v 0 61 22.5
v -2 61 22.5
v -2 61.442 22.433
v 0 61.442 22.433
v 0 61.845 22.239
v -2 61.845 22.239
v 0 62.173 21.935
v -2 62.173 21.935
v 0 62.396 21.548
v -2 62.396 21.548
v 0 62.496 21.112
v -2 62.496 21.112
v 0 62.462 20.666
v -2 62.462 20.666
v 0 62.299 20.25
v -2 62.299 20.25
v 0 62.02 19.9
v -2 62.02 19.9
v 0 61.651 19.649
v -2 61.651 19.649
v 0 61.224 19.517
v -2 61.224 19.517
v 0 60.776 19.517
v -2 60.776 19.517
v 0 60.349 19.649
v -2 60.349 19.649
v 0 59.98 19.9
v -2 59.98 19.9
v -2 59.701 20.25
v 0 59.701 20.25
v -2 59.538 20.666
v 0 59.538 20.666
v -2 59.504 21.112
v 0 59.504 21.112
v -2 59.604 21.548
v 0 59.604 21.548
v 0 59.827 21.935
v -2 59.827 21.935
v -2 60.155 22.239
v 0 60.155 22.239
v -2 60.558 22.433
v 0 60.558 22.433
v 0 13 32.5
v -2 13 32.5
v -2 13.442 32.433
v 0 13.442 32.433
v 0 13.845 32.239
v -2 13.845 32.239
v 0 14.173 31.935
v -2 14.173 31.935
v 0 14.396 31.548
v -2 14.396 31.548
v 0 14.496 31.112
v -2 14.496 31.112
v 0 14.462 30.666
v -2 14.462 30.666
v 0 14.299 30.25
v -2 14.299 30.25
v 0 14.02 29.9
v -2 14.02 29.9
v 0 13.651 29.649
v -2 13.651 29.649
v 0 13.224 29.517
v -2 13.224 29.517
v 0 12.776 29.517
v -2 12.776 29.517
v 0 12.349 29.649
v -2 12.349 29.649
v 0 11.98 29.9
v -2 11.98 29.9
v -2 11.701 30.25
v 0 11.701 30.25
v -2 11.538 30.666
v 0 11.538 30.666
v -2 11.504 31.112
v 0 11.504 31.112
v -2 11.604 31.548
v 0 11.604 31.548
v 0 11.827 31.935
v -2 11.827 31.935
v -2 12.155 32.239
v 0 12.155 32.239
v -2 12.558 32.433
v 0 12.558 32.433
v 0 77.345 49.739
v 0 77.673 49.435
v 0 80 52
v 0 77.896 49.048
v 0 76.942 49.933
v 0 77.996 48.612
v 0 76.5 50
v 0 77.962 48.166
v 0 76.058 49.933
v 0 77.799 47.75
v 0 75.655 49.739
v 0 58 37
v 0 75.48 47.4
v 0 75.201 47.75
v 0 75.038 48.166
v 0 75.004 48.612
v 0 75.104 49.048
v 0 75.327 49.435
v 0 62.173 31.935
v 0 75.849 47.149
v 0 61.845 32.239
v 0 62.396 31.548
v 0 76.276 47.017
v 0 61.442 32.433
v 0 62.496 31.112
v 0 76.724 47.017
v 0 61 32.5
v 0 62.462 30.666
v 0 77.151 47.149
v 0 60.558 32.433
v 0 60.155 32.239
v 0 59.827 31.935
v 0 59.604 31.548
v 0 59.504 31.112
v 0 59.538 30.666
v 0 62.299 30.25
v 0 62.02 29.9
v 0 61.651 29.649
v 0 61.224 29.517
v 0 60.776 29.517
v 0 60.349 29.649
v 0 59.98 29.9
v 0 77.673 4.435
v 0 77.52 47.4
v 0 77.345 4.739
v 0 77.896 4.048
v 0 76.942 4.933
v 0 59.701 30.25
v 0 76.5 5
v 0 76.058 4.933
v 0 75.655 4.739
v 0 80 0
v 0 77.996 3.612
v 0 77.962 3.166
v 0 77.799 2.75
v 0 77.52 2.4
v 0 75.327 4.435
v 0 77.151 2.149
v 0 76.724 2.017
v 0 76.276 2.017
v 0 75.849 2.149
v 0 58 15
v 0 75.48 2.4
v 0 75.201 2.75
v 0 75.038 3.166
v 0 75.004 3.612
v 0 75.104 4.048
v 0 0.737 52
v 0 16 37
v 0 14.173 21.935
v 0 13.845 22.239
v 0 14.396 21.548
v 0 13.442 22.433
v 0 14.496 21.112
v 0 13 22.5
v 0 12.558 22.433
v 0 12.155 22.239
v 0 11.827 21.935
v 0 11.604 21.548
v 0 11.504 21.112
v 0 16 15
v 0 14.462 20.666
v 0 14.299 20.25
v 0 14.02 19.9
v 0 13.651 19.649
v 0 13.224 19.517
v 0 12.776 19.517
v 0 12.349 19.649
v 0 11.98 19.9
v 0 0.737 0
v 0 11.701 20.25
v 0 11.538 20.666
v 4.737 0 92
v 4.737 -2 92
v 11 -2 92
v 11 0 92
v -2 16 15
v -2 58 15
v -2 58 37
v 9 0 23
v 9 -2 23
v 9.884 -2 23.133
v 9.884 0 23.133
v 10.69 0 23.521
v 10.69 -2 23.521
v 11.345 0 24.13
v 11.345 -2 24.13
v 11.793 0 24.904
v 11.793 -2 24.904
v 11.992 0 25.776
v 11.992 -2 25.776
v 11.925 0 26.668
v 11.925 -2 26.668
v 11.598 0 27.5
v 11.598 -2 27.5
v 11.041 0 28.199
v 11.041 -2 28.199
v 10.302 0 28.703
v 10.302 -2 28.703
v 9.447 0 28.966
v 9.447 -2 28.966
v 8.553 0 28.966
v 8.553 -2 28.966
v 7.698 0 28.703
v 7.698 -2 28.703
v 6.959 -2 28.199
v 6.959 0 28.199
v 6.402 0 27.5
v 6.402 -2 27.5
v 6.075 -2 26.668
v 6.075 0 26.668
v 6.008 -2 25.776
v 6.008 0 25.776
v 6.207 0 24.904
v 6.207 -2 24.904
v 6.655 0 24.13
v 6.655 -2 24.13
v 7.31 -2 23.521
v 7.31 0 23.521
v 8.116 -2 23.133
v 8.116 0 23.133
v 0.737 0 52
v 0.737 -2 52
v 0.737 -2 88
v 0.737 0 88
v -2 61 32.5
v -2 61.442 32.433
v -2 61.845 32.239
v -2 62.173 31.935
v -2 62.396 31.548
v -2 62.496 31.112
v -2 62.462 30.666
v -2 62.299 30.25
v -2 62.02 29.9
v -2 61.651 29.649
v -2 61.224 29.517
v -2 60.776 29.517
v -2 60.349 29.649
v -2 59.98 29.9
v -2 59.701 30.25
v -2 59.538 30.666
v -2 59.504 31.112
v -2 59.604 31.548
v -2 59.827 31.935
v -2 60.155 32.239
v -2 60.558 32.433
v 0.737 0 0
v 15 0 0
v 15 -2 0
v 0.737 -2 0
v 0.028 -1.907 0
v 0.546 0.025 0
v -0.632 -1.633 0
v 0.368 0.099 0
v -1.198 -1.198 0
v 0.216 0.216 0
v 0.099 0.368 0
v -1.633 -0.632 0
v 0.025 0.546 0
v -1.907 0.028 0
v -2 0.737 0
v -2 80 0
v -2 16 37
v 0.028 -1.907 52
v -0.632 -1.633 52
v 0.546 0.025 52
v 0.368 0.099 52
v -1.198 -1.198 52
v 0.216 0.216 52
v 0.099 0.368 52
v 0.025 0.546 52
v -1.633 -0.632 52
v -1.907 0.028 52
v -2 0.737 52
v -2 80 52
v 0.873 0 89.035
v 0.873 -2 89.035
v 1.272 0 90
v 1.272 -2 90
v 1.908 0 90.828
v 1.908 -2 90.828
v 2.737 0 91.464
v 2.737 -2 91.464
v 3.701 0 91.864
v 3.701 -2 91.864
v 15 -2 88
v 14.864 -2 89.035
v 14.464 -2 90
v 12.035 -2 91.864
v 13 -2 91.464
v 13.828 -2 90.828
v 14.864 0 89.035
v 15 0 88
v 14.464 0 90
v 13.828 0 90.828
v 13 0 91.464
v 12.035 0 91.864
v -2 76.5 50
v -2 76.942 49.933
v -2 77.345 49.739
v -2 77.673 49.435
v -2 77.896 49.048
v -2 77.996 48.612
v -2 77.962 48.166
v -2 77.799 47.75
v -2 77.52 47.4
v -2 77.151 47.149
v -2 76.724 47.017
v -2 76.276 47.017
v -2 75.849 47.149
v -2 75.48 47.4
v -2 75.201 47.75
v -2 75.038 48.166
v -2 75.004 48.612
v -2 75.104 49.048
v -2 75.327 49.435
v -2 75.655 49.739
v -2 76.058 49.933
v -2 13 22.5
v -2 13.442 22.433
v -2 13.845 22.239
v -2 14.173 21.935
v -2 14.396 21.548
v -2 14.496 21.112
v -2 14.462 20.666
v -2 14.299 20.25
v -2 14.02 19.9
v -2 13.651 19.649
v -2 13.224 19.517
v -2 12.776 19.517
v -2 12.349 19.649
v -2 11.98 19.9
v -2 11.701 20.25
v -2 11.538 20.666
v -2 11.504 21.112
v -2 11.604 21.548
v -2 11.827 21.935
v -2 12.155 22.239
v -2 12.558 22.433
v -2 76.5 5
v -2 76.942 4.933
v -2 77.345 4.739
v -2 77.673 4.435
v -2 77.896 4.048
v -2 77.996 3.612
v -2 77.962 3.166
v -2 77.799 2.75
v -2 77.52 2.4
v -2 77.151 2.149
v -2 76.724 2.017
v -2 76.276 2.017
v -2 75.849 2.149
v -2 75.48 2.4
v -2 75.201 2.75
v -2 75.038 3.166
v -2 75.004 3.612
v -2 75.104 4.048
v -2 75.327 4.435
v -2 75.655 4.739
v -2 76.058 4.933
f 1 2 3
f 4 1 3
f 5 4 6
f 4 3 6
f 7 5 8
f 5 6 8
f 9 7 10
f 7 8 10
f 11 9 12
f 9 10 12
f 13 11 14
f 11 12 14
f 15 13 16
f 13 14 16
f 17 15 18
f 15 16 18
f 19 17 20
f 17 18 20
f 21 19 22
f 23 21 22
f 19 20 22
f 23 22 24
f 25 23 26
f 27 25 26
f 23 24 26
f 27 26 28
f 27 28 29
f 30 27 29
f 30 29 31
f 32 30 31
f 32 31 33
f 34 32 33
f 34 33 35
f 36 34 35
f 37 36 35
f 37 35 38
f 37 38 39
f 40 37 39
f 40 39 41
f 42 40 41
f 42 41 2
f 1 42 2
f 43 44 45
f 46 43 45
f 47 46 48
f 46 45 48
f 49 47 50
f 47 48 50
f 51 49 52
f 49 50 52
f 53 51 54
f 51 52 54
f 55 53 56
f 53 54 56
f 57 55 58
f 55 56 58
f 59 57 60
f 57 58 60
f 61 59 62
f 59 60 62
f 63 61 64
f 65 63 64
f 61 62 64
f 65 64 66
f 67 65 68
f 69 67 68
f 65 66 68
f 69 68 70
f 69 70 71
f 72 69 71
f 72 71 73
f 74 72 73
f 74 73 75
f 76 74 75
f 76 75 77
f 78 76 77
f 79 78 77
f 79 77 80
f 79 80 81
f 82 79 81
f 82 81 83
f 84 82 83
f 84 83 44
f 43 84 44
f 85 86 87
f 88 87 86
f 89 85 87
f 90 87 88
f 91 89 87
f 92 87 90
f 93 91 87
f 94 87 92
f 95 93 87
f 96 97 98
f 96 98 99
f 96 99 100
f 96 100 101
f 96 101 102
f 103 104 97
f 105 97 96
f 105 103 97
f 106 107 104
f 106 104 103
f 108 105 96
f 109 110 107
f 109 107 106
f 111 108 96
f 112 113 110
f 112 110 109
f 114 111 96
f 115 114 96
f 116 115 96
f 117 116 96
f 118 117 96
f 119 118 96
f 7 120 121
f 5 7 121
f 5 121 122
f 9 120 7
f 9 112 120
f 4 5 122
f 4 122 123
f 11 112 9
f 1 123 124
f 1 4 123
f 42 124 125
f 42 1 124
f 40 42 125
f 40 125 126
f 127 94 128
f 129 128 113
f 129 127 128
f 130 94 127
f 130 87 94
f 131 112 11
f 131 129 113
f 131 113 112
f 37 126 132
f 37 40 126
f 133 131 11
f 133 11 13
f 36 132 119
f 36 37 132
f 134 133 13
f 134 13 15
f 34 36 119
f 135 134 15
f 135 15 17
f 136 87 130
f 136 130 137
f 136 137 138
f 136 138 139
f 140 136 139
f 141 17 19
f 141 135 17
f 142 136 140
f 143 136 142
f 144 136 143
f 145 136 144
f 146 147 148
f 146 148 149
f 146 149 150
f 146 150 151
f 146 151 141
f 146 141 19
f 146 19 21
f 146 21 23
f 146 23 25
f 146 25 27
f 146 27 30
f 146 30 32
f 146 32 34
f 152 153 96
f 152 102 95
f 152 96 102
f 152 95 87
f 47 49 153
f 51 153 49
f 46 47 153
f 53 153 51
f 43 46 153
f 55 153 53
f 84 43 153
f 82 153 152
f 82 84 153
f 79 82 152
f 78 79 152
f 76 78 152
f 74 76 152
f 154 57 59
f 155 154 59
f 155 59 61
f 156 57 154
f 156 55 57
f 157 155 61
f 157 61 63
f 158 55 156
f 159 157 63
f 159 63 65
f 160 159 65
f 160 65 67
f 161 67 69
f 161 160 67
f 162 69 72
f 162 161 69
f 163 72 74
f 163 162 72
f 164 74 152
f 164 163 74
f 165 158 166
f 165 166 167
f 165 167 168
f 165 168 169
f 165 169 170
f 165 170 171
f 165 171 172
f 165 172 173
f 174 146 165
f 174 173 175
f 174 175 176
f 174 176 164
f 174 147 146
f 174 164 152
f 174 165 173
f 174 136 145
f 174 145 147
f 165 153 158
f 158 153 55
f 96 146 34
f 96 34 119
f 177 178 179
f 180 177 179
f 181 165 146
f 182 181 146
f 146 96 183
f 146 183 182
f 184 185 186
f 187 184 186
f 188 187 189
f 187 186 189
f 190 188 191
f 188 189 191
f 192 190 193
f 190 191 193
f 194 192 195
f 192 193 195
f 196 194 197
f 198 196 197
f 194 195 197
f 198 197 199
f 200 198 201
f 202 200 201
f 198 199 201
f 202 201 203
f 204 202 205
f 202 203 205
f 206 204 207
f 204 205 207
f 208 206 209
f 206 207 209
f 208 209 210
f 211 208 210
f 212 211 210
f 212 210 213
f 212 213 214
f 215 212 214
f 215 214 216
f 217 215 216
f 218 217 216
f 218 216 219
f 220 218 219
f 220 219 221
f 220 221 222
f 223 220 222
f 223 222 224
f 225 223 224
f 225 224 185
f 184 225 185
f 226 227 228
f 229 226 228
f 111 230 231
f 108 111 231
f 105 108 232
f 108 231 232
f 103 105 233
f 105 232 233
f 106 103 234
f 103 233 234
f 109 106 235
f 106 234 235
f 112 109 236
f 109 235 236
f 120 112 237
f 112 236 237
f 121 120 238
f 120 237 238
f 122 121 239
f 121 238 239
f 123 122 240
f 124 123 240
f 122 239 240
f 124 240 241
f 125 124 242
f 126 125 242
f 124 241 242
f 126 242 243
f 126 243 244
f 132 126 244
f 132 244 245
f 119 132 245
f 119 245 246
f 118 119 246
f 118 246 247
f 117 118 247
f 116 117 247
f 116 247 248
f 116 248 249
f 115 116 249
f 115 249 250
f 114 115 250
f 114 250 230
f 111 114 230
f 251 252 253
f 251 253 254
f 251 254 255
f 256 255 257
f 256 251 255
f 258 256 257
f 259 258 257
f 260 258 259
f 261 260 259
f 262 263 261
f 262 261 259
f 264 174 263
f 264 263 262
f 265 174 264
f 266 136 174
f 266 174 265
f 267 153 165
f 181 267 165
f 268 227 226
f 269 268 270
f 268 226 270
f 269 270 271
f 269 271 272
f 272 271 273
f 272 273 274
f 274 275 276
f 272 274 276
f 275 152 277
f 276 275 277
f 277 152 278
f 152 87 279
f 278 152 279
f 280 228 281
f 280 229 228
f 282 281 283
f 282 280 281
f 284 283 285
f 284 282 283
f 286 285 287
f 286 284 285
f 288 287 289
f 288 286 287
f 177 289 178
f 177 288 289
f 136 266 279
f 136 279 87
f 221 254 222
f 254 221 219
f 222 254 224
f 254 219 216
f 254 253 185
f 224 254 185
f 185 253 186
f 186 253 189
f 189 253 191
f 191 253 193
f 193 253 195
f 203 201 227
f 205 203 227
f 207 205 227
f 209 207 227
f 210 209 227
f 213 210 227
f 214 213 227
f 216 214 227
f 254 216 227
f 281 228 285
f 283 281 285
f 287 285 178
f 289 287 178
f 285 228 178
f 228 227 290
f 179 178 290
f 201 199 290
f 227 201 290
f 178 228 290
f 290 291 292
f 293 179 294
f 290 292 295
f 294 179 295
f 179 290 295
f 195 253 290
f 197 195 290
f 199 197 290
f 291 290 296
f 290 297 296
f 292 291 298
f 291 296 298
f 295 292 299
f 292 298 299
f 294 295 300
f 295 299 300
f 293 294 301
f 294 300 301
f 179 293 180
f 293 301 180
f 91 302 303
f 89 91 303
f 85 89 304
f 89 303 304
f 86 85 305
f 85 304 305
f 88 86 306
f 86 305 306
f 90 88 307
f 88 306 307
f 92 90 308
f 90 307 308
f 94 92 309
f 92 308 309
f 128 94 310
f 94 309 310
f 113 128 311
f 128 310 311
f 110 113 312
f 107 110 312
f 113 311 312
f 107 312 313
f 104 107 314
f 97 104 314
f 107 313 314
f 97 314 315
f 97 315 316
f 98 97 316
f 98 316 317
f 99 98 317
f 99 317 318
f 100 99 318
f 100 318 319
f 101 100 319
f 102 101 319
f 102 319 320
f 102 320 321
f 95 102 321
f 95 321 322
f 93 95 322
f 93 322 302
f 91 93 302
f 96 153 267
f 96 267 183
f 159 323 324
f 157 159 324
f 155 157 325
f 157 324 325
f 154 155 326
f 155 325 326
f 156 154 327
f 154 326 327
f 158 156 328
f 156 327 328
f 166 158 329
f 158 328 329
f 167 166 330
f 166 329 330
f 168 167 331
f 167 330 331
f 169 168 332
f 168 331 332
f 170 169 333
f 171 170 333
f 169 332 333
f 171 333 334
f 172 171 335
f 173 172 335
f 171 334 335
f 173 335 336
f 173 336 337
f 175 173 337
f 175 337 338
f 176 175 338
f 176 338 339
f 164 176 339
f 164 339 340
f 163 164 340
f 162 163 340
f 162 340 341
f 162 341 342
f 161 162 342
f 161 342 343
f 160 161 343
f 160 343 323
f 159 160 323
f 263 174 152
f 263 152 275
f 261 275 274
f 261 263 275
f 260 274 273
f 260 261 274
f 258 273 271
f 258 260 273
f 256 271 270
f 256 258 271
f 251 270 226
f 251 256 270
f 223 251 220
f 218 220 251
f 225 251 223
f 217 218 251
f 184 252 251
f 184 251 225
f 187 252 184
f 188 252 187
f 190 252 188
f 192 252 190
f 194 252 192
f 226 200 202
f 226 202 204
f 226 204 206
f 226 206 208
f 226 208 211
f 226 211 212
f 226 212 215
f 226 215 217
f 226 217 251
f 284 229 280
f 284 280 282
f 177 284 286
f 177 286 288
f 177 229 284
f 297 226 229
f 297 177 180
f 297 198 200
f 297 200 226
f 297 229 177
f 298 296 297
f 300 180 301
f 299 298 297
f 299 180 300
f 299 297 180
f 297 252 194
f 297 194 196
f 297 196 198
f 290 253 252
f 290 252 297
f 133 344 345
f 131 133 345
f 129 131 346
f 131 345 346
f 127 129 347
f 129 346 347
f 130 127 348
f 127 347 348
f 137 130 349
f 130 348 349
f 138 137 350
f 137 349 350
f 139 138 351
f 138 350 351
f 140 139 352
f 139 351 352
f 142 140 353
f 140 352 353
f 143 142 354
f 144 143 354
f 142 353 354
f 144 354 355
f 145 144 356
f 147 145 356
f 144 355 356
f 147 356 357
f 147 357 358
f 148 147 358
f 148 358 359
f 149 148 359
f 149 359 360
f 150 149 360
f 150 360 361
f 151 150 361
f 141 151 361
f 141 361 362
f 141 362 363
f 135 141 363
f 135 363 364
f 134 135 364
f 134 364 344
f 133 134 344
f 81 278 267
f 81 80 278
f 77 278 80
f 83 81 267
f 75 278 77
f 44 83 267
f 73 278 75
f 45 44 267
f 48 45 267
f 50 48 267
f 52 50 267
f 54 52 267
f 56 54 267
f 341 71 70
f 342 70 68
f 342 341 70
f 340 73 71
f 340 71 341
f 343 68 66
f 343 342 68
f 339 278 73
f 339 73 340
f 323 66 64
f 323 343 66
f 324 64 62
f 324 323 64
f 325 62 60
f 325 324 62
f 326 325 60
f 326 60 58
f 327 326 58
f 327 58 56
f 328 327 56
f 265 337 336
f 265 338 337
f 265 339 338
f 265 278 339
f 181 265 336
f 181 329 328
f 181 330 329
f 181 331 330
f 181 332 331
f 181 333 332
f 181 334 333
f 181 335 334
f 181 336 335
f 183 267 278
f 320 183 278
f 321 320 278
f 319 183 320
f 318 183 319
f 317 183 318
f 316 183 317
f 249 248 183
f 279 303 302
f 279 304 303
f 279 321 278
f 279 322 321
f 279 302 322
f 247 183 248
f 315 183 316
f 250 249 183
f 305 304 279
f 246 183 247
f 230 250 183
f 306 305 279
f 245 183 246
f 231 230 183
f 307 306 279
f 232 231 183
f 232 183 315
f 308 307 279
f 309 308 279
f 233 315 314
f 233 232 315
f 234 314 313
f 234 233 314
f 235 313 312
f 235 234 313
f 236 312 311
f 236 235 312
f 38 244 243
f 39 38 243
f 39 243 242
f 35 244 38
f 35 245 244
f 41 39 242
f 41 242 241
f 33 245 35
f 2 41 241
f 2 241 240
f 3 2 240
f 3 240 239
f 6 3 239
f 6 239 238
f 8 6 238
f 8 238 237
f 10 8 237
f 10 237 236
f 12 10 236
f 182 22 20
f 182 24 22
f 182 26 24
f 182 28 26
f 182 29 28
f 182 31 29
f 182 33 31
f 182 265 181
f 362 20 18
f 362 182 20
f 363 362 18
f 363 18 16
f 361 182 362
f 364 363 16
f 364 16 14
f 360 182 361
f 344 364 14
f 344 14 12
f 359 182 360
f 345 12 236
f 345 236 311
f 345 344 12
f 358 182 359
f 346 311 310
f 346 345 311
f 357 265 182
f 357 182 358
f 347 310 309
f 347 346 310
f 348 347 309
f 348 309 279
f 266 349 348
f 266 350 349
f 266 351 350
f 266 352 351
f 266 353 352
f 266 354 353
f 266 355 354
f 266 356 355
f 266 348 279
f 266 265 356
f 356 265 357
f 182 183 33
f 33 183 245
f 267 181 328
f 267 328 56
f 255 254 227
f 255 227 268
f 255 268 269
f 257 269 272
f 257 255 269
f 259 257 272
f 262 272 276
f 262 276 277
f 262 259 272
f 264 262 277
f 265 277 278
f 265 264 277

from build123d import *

# Parameters (mm, degrees)
SM_BASE_FLANGE_1_DEPTH       = 52
CUT_EXTRUDE_1_REACH          = 100.25
SKETCH_6_R                   = 3
HOLE_WIZARD_M3_2_D           = 2.5
HOLE_WIZARD_M3_2_DEPTH       = 7.5
HOLE_WIZARD_M3_2_CBORE_D     = 3
HOLE_WIZARD_M3_2_CBORE_DEPTH = 6
HOLE_WIZARD_M3_2_TIP         = 0.751075774
SKETCH_9_W                   = 22
SKETCH_9_H                   = 42
CUT_EXTRUDE_2_DEPTH          = 10
SKETCH_10_W                  = 40
SKETCH_10_H                  = 14.2634
EXTRUDE_4_DEPTH              = 2
FILLET_1_R                   = 4


# Sheet-metal steps are written as plain solids
with BuildPart() as part:
    # Sketch 1 → 基材-凸緣1 (new body)
    with BuildSketch(Plane.XY):
        with BuildLine():
            Line((0, 80), (0, 0.7366))
            ThreePointArc((0, 0.7366), (0.215745145, 0.215745145), (0.7366, 0))
            Line((0.7366, 0), (15, 0))
            Line((15, 0), (15, -2))
            Line((15, -2), (0.7366, -2))
            ThreePointArc((0.7366, -2), (-1.198468417, -1.198468417), (-2, 0.7366))
            Line((-2, 0.7366), (-2, 80))
            Line((-2, 80), (0, 80))
        make_face()
    extrude(amount=SM_BASE_FLANGE_1_DEPTH)

    # 草圖6 → 除料-伸長1 (cut, up to next)
    with BuildSketch(Plane.XZ.offset(2), mode=Mode.PRIVATE) as cut_extrude_1_sk1:
        with Locations(Location((9, 26, 0), (0, 0, 270))):
            Circle(SKETCH_6_R)
    cut_extrude_1_tool1 = extrude(cut_extrude_1_sk1.sketch, amount=-CUT_EXTRUDE_1_REACH, mode=Mode.PRIVATE) & part.part
    add(cut_extrude_1_tool1.solids().sort_by_distance((9, -2, 26))[0], mode=Mode.SUBTRACT)

    # M3 螺紋孔2
    with Locations(Plane.ZY.offset(2)):
        with Locations((21, 61), (21, 13), (31, 13), (31, 61), (3.5, 76.5), (48.5, 76.5)):
            CounterBoreHole(HOLE_WIZARD_M3_2_D / 2, HOLE_WIZARD_M3_2_CBORE_D / 2, HOLE_WIZARD_M3_2_CBORE_DEPTH, depth=HOLE_WIZARD_M3_2_DEPTH)
            with Locations((0, 0, -(HOLE_WIZARD_M3_2_DEPTH + HOLE_WIZARD_M3_2_TIP / 2))):  # 118° drill point
                Cone(0, HOLE_WIZARD_M3_2_D / 2, HOLE_WIZARD_M3_2_TIP, mode=Mode.SUBTRACT)

    # 草圖9 → 除料-伸長2 (cut)
    with BuildSketch(Plane(origin=(0, 0, 0), x_dir=(0, 0, -1), z_dir=(1, 0, 0))):
        with Locations((-26, 37)):
            Rectangle(SKETCH_9_W, SKETCH_9_H)
    extrude(amount=-CUT_EXTRUDE_2_DEPTH, mode=Mode.SUBTRACT)

    # 草圖10 → 填料-伸長4 (add)
    with BuildSketch(Plane.ZX.offset(-2)):
        with Locations((72, 7.8683)):
            Rectangle(SKETCH_10_W, SKETCH_10_H)
    extrude(amount=EXTRUDE_4_DEPTH)

    # 圓角1
    fillet_1_edges = [part.edges().sort_by_distance(p)[0] for p in [
        (0.7366, -1, 92),
        (15, -1, 92),
    ]]
    fillet(fillet_1_edges, radius=FILLET_1_R)


solid = part.part
